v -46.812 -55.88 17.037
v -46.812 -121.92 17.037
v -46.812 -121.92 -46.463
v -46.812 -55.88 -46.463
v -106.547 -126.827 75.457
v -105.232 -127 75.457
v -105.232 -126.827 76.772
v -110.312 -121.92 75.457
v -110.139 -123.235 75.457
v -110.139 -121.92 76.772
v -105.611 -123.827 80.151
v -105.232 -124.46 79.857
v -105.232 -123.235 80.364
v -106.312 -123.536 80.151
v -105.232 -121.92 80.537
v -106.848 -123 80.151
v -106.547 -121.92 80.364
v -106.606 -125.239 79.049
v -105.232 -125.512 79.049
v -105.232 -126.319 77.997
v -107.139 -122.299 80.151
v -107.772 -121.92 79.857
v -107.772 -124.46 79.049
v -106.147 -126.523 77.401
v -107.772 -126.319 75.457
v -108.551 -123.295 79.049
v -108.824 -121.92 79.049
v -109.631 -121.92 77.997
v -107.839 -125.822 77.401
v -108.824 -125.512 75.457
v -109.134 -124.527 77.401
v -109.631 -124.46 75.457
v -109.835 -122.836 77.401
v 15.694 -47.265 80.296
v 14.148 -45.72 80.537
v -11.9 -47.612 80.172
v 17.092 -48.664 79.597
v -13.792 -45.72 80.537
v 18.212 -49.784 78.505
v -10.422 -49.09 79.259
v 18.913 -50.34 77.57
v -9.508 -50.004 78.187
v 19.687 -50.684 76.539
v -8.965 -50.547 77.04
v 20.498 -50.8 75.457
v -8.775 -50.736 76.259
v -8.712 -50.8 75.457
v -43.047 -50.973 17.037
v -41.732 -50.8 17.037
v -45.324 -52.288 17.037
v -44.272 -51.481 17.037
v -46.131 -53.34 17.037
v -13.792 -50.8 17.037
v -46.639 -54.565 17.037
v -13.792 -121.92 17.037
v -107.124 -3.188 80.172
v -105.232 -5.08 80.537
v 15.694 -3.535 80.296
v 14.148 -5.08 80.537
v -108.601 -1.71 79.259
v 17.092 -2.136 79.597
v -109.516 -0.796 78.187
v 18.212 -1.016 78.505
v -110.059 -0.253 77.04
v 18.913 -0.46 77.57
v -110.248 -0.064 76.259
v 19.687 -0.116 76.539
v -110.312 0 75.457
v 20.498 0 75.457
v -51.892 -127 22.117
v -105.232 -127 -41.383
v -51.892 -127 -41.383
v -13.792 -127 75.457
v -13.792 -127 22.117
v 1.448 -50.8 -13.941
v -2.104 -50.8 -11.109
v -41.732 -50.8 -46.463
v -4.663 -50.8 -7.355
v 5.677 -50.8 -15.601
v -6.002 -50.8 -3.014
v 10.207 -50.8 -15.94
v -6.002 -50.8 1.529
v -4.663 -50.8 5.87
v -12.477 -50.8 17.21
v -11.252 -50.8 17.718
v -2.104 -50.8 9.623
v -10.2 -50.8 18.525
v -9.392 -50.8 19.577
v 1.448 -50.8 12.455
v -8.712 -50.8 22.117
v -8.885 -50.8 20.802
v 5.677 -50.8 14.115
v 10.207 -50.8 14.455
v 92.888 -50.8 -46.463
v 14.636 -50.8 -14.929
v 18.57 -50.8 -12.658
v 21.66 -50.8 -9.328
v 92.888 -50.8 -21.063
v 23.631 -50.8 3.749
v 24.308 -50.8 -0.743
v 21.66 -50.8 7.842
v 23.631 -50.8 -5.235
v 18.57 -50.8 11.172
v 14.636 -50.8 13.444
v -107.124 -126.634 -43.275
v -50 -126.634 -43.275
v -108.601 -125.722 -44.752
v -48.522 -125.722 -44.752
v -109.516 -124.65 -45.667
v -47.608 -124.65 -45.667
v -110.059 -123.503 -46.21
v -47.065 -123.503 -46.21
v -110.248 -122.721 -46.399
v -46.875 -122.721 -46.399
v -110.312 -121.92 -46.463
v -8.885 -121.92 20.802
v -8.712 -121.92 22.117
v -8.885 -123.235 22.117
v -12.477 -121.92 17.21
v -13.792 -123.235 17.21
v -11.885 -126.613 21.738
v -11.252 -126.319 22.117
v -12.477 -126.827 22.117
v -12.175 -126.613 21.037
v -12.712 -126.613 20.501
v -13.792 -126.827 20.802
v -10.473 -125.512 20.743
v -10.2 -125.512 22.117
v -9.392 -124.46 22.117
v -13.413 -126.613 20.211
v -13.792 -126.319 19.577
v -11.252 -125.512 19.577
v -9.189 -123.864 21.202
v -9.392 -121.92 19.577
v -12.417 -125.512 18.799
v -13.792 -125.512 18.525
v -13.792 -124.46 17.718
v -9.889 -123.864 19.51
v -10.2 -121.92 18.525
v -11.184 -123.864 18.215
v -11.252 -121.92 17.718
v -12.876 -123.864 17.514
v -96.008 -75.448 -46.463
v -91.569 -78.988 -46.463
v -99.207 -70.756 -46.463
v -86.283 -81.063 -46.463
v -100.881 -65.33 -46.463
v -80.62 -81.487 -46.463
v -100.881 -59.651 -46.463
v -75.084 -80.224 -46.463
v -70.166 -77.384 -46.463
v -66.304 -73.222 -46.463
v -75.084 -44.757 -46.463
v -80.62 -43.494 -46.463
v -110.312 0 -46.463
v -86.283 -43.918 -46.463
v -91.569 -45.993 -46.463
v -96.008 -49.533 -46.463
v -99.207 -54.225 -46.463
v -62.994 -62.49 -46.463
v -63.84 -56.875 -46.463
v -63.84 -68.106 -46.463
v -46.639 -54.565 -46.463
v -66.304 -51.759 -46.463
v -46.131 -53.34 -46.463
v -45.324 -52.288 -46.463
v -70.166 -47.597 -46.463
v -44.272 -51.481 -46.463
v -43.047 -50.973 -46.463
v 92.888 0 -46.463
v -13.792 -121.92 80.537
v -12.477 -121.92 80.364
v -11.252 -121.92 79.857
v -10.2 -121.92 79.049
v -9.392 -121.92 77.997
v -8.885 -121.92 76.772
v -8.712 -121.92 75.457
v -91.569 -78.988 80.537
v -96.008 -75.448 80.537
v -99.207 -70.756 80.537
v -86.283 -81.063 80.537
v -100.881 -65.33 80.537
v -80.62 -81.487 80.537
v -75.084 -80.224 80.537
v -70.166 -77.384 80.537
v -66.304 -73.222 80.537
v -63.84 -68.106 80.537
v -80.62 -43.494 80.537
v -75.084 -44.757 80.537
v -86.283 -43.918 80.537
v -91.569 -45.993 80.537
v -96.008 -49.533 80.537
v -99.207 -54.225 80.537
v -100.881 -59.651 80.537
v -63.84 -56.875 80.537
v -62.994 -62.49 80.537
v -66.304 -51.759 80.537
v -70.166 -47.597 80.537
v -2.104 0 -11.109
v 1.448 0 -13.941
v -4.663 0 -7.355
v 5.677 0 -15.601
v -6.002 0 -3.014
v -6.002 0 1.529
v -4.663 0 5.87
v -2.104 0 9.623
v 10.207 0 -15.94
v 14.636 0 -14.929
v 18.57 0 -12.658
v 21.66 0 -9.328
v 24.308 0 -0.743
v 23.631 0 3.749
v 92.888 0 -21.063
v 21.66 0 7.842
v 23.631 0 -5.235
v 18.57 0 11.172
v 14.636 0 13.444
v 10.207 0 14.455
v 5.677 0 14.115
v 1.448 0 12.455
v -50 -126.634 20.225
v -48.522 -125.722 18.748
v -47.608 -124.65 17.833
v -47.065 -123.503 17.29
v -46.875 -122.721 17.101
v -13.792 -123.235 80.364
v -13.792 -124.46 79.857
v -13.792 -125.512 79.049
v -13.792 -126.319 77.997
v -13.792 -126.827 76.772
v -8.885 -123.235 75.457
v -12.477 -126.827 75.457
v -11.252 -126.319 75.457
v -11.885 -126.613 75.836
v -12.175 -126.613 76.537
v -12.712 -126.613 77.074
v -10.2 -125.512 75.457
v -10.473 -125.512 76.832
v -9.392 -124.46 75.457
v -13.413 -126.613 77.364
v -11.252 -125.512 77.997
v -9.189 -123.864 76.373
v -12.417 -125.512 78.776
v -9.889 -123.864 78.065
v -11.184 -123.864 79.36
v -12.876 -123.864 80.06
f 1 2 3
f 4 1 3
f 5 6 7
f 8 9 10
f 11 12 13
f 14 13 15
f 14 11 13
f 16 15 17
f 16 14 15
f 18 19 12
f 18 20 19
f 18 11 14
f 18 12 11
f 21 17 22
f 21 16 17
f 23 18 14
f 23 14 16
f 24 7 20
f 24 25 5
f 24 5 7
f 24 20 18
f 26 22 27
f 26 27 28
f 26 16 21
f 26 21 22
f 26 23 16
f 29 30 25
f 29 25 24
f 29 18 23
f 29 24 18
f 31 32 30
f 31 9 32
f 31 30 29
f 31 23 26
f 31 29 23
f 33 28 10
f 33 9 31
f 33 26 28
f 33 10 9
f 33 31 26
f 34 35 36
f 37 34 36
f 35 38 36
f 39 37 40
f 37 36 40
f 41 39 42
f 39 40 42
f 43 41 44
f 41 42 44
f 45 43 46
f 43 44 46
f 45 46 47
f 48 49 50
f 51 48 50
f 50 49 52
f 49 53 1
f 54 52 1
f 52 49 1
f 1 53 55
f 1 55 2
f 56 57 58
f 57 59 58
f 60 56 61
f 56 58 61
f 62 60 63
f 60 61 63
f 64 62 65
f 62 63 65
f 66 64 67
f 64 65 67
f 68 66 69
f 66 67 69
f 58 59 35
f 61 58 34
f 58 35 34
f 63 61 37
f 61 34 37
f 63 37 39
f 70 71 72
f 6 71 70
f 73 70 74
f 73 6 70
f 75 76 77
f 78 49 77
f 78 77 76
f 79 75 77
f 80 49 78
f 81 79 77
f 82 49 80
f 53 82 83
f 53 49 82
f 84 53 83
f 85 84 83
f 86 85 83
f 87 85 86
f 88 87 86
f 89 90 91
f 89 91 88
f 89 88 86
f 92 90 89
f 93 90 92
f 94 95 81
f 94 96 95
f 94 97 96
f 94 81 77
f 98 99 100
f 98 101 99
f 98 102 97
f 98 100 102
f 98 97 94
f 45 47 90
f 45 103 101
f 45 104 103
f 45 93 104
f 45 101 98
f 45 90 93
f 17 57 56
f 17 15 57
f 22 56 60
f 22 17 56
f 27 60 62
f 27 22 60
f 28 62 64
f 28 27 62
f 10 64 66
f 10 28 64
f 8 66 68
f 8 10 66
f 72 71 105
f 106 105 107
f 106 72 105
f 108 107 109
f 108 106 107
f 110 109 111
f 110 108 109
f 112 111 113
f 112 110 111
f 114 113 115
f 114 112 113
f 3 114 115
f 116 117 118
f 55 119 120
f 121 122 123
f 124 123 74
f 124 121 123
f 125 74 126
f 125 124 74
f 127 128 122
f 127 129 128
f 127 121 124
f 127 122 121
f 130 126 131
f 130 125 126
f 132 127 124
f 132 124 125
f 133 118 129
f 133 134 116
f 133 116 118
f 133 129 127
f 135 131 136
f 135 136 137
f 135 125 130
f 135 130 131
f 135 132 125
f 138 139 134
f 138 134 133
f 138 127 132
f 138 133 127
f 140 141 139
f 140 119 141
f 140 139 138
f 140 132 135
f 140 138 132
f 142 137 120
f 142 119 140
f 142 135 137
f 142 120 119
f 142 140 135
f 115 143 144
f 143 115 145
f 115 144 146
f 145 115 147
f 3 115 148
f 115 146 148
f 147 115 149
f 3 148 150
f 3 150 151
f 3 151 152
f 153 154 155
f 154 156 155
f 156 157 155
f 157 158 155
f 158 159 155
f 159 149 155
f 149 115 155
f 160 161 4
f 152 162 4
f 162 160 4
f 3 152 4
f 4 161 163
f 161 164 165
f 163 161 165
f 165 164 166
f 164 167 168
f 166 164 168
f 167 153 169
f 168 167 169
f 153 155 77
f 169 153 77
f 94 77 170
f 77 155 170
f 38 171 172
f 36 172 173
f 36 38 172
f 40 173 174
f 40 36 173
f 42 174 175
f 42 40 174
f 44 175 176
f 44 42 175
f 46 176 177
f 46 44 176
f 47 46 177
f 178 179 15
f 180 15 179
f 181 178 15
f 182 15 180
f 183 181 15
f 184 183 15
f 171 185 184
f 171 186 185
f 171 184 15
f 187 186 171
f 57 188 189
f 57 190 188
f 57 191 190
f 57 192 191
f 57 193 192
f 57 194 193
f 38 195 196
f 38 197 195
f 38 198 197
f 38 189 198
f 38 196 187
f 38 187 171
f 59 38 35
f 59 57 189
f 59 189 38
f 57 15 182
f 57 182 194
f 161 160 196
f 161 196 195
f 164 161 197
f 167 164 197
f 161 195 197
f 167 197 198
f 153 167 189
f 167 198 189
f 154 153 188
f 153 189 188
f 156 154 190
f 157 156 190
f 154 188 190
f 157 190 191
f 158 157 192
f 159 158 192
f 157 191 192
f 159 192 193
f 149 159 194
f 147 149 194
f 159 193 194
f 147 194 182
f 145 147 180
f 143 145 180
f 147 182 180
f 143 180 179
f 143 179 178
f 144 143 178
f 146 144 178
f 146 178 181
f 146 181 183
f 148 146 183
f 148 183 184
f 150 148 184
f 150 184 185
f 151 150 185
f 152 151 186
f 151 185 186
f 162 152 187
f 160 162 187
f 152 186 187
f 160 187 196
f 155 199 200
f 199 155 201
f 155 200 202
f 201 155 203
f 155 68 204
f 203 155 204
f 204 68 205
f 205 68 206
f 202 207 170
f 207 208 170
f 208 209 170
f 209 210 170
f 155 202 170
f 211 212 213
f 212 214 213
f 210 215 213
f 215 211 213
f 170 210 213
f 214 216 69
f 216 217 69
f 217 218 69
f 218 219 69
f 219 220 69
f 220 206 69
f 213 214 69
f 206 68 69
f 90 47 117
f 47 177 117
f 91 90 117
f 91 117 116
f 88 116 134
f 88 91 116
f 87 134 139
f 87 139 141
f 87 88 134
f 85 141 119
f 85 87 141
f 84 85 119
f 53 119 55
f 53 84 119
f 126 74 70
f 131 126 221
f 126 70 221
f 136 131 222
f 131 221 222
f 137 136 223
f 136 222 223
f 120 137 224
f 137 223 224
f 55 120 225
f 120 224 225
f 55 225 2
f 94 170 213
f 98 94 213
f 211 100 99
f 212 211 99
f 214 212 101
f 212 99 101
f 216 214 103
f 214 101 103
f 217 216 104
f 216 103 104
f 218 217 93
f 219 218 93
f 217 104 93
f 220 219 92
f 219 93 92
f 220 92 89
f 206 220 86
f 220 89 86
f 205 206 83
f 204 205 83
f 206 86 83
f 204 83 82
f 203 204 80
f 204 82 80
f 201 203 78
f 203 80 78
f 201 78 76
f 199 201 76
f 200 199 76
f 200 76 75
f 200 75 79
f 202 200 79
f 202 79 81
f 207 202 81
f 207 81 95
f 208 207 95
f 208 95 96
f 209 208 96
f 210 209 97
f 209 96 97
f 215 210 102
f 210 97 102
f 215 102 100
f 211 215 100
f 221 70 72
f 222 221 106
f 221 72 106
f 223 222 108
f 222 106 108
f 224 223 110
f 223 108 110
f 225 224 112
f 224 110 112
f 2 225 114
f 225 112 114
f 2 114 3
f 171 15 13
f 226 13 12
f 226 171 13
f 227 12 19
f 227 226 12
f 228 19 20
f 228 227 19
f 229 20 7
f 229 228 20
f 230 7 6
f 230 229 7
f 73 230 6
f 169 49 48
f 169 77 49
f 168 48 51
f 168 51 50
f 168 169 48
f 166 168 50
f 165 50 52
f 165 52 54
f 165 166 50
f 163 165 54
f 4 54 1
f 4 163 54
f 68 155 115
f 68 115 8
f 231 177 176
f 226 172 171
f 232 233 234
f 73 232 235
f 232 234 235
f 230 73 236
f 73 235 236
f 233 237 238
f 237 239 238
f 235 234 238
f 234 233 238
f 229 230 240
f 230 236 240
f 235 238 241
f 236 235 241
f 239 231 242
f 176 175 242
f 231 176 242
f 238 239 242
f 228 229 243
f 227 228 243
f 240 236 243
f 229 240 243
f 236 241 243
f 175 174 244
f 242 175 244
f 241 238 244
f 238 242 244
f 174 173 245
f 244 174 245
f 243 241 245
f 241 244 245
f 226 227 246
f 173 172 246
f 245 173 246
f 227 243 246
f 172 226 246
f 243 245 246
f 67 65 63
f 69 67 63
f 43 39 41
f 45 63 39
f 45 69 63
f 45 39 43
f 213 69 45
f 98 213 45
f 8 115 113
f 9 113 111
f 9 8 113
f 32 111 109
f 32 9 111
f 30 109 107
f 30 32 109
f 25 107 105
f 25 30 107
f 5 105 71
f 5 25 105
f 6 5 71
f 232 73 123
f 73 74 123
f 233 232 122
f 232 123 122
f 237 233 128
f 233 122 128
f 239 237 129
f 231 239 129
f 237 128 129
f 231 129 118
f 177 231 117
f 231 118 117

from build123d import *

# Parameters (mm, degrees)
F0_W     = 203.2
F0_H     = 127
F1_DEPTH = 127
F3_DEPTH = 76.2
F4_SIZE2 = 101.6
F4_SIZE  = 76.2
F5_R     = 5.08
F6_R     = 15.24
F7_DEPTH = 50.8
F8_R     = 19.05
F9_DEPTH = 127


with BuildPart() as f1:
    # F0 (on Front) → F1 (new body)
    with BuildSketch(Plane.XZ):
        with Locations((-8.7118318382, 17.0372370631)):
            Rectangle(F0_W, F0_H)
    extrude(amount=F1_DEPTH)

    # F2 (on face) → F3 (cut)
    with BuildSketch(Plane.XZ.offset(127)):
        Polygon((92.8881681618, 80.5372370631), (-8.7118318382, 80.5372370631), (-8.7118318382, 17.0372370631), (-46.8118318382, 17.0372370631), (-46.8118318382, -46.4627629369), (92.8881681618, -46.4627629369), align=None)
    extrude(amount=-F3_DEPTH, mode=Mode.SUBTRACT)

    # F4
    f4_edges = [f1.edges().sort_by_distance(p)[0] for p in [
        (92.888168, -25.4, 80.537237),
    ]]
    f4_side = f1.faces().sort_by_distance((-30.48326, -52.614286, 80.537237))[0]
    chamfer(f4_edges, length=F4_SIZE, length2=F4_SIZE2, reference=f4_side)

    # F5
    f5_edges = [f1.edges().sort_by_distance(p)[0] for p in [
        (-8.711832, -88.9, 80.537237),
        (3.988168, -50.8, 80.537237),
        (-8.711832, -88.9, 17.037237),
        (-8.711832, -127, 48.787237),
        (-27.761832, -127, 17.037237),
        (-46.811832, -127, -14.712763),
        (-78.561832, -127, -46.462763),
        (-110.311832, -127, 17.037237),
        (-59.511832, -127, 80.537237),
        (-46.811832, -50.8, -14.712763),
        (16.688168, -25.4, 80.537237),
        (-46.811832, 0, 80.537237),
        (-110.311832, -63.5, 80.537237),
    ]]
    fillet(f5_edges, radius=F5_R)

    # F6 (on face) → F7 (cut, through all)
    with BuildSketch(Plane.XZ.offset(50.8)):
        with Locations((9.0681681618, -0.7427629369)):
            Circle(F6_R)
    extrude(amount=-F7_DEPTH, mode=Mode.SUBTRACT)

    # F8 (on face) → F9 (cut, through all)
    with BuildSketch(Plane.XY.offset(80.5372370631)):
        with Locations((-82.0436404108, -62.4904338136)):
            Circle(F8_R)
    extrude(amount=-F9_DEPTH, mode=Mode.SUBTRACT)


solid = f1.part
